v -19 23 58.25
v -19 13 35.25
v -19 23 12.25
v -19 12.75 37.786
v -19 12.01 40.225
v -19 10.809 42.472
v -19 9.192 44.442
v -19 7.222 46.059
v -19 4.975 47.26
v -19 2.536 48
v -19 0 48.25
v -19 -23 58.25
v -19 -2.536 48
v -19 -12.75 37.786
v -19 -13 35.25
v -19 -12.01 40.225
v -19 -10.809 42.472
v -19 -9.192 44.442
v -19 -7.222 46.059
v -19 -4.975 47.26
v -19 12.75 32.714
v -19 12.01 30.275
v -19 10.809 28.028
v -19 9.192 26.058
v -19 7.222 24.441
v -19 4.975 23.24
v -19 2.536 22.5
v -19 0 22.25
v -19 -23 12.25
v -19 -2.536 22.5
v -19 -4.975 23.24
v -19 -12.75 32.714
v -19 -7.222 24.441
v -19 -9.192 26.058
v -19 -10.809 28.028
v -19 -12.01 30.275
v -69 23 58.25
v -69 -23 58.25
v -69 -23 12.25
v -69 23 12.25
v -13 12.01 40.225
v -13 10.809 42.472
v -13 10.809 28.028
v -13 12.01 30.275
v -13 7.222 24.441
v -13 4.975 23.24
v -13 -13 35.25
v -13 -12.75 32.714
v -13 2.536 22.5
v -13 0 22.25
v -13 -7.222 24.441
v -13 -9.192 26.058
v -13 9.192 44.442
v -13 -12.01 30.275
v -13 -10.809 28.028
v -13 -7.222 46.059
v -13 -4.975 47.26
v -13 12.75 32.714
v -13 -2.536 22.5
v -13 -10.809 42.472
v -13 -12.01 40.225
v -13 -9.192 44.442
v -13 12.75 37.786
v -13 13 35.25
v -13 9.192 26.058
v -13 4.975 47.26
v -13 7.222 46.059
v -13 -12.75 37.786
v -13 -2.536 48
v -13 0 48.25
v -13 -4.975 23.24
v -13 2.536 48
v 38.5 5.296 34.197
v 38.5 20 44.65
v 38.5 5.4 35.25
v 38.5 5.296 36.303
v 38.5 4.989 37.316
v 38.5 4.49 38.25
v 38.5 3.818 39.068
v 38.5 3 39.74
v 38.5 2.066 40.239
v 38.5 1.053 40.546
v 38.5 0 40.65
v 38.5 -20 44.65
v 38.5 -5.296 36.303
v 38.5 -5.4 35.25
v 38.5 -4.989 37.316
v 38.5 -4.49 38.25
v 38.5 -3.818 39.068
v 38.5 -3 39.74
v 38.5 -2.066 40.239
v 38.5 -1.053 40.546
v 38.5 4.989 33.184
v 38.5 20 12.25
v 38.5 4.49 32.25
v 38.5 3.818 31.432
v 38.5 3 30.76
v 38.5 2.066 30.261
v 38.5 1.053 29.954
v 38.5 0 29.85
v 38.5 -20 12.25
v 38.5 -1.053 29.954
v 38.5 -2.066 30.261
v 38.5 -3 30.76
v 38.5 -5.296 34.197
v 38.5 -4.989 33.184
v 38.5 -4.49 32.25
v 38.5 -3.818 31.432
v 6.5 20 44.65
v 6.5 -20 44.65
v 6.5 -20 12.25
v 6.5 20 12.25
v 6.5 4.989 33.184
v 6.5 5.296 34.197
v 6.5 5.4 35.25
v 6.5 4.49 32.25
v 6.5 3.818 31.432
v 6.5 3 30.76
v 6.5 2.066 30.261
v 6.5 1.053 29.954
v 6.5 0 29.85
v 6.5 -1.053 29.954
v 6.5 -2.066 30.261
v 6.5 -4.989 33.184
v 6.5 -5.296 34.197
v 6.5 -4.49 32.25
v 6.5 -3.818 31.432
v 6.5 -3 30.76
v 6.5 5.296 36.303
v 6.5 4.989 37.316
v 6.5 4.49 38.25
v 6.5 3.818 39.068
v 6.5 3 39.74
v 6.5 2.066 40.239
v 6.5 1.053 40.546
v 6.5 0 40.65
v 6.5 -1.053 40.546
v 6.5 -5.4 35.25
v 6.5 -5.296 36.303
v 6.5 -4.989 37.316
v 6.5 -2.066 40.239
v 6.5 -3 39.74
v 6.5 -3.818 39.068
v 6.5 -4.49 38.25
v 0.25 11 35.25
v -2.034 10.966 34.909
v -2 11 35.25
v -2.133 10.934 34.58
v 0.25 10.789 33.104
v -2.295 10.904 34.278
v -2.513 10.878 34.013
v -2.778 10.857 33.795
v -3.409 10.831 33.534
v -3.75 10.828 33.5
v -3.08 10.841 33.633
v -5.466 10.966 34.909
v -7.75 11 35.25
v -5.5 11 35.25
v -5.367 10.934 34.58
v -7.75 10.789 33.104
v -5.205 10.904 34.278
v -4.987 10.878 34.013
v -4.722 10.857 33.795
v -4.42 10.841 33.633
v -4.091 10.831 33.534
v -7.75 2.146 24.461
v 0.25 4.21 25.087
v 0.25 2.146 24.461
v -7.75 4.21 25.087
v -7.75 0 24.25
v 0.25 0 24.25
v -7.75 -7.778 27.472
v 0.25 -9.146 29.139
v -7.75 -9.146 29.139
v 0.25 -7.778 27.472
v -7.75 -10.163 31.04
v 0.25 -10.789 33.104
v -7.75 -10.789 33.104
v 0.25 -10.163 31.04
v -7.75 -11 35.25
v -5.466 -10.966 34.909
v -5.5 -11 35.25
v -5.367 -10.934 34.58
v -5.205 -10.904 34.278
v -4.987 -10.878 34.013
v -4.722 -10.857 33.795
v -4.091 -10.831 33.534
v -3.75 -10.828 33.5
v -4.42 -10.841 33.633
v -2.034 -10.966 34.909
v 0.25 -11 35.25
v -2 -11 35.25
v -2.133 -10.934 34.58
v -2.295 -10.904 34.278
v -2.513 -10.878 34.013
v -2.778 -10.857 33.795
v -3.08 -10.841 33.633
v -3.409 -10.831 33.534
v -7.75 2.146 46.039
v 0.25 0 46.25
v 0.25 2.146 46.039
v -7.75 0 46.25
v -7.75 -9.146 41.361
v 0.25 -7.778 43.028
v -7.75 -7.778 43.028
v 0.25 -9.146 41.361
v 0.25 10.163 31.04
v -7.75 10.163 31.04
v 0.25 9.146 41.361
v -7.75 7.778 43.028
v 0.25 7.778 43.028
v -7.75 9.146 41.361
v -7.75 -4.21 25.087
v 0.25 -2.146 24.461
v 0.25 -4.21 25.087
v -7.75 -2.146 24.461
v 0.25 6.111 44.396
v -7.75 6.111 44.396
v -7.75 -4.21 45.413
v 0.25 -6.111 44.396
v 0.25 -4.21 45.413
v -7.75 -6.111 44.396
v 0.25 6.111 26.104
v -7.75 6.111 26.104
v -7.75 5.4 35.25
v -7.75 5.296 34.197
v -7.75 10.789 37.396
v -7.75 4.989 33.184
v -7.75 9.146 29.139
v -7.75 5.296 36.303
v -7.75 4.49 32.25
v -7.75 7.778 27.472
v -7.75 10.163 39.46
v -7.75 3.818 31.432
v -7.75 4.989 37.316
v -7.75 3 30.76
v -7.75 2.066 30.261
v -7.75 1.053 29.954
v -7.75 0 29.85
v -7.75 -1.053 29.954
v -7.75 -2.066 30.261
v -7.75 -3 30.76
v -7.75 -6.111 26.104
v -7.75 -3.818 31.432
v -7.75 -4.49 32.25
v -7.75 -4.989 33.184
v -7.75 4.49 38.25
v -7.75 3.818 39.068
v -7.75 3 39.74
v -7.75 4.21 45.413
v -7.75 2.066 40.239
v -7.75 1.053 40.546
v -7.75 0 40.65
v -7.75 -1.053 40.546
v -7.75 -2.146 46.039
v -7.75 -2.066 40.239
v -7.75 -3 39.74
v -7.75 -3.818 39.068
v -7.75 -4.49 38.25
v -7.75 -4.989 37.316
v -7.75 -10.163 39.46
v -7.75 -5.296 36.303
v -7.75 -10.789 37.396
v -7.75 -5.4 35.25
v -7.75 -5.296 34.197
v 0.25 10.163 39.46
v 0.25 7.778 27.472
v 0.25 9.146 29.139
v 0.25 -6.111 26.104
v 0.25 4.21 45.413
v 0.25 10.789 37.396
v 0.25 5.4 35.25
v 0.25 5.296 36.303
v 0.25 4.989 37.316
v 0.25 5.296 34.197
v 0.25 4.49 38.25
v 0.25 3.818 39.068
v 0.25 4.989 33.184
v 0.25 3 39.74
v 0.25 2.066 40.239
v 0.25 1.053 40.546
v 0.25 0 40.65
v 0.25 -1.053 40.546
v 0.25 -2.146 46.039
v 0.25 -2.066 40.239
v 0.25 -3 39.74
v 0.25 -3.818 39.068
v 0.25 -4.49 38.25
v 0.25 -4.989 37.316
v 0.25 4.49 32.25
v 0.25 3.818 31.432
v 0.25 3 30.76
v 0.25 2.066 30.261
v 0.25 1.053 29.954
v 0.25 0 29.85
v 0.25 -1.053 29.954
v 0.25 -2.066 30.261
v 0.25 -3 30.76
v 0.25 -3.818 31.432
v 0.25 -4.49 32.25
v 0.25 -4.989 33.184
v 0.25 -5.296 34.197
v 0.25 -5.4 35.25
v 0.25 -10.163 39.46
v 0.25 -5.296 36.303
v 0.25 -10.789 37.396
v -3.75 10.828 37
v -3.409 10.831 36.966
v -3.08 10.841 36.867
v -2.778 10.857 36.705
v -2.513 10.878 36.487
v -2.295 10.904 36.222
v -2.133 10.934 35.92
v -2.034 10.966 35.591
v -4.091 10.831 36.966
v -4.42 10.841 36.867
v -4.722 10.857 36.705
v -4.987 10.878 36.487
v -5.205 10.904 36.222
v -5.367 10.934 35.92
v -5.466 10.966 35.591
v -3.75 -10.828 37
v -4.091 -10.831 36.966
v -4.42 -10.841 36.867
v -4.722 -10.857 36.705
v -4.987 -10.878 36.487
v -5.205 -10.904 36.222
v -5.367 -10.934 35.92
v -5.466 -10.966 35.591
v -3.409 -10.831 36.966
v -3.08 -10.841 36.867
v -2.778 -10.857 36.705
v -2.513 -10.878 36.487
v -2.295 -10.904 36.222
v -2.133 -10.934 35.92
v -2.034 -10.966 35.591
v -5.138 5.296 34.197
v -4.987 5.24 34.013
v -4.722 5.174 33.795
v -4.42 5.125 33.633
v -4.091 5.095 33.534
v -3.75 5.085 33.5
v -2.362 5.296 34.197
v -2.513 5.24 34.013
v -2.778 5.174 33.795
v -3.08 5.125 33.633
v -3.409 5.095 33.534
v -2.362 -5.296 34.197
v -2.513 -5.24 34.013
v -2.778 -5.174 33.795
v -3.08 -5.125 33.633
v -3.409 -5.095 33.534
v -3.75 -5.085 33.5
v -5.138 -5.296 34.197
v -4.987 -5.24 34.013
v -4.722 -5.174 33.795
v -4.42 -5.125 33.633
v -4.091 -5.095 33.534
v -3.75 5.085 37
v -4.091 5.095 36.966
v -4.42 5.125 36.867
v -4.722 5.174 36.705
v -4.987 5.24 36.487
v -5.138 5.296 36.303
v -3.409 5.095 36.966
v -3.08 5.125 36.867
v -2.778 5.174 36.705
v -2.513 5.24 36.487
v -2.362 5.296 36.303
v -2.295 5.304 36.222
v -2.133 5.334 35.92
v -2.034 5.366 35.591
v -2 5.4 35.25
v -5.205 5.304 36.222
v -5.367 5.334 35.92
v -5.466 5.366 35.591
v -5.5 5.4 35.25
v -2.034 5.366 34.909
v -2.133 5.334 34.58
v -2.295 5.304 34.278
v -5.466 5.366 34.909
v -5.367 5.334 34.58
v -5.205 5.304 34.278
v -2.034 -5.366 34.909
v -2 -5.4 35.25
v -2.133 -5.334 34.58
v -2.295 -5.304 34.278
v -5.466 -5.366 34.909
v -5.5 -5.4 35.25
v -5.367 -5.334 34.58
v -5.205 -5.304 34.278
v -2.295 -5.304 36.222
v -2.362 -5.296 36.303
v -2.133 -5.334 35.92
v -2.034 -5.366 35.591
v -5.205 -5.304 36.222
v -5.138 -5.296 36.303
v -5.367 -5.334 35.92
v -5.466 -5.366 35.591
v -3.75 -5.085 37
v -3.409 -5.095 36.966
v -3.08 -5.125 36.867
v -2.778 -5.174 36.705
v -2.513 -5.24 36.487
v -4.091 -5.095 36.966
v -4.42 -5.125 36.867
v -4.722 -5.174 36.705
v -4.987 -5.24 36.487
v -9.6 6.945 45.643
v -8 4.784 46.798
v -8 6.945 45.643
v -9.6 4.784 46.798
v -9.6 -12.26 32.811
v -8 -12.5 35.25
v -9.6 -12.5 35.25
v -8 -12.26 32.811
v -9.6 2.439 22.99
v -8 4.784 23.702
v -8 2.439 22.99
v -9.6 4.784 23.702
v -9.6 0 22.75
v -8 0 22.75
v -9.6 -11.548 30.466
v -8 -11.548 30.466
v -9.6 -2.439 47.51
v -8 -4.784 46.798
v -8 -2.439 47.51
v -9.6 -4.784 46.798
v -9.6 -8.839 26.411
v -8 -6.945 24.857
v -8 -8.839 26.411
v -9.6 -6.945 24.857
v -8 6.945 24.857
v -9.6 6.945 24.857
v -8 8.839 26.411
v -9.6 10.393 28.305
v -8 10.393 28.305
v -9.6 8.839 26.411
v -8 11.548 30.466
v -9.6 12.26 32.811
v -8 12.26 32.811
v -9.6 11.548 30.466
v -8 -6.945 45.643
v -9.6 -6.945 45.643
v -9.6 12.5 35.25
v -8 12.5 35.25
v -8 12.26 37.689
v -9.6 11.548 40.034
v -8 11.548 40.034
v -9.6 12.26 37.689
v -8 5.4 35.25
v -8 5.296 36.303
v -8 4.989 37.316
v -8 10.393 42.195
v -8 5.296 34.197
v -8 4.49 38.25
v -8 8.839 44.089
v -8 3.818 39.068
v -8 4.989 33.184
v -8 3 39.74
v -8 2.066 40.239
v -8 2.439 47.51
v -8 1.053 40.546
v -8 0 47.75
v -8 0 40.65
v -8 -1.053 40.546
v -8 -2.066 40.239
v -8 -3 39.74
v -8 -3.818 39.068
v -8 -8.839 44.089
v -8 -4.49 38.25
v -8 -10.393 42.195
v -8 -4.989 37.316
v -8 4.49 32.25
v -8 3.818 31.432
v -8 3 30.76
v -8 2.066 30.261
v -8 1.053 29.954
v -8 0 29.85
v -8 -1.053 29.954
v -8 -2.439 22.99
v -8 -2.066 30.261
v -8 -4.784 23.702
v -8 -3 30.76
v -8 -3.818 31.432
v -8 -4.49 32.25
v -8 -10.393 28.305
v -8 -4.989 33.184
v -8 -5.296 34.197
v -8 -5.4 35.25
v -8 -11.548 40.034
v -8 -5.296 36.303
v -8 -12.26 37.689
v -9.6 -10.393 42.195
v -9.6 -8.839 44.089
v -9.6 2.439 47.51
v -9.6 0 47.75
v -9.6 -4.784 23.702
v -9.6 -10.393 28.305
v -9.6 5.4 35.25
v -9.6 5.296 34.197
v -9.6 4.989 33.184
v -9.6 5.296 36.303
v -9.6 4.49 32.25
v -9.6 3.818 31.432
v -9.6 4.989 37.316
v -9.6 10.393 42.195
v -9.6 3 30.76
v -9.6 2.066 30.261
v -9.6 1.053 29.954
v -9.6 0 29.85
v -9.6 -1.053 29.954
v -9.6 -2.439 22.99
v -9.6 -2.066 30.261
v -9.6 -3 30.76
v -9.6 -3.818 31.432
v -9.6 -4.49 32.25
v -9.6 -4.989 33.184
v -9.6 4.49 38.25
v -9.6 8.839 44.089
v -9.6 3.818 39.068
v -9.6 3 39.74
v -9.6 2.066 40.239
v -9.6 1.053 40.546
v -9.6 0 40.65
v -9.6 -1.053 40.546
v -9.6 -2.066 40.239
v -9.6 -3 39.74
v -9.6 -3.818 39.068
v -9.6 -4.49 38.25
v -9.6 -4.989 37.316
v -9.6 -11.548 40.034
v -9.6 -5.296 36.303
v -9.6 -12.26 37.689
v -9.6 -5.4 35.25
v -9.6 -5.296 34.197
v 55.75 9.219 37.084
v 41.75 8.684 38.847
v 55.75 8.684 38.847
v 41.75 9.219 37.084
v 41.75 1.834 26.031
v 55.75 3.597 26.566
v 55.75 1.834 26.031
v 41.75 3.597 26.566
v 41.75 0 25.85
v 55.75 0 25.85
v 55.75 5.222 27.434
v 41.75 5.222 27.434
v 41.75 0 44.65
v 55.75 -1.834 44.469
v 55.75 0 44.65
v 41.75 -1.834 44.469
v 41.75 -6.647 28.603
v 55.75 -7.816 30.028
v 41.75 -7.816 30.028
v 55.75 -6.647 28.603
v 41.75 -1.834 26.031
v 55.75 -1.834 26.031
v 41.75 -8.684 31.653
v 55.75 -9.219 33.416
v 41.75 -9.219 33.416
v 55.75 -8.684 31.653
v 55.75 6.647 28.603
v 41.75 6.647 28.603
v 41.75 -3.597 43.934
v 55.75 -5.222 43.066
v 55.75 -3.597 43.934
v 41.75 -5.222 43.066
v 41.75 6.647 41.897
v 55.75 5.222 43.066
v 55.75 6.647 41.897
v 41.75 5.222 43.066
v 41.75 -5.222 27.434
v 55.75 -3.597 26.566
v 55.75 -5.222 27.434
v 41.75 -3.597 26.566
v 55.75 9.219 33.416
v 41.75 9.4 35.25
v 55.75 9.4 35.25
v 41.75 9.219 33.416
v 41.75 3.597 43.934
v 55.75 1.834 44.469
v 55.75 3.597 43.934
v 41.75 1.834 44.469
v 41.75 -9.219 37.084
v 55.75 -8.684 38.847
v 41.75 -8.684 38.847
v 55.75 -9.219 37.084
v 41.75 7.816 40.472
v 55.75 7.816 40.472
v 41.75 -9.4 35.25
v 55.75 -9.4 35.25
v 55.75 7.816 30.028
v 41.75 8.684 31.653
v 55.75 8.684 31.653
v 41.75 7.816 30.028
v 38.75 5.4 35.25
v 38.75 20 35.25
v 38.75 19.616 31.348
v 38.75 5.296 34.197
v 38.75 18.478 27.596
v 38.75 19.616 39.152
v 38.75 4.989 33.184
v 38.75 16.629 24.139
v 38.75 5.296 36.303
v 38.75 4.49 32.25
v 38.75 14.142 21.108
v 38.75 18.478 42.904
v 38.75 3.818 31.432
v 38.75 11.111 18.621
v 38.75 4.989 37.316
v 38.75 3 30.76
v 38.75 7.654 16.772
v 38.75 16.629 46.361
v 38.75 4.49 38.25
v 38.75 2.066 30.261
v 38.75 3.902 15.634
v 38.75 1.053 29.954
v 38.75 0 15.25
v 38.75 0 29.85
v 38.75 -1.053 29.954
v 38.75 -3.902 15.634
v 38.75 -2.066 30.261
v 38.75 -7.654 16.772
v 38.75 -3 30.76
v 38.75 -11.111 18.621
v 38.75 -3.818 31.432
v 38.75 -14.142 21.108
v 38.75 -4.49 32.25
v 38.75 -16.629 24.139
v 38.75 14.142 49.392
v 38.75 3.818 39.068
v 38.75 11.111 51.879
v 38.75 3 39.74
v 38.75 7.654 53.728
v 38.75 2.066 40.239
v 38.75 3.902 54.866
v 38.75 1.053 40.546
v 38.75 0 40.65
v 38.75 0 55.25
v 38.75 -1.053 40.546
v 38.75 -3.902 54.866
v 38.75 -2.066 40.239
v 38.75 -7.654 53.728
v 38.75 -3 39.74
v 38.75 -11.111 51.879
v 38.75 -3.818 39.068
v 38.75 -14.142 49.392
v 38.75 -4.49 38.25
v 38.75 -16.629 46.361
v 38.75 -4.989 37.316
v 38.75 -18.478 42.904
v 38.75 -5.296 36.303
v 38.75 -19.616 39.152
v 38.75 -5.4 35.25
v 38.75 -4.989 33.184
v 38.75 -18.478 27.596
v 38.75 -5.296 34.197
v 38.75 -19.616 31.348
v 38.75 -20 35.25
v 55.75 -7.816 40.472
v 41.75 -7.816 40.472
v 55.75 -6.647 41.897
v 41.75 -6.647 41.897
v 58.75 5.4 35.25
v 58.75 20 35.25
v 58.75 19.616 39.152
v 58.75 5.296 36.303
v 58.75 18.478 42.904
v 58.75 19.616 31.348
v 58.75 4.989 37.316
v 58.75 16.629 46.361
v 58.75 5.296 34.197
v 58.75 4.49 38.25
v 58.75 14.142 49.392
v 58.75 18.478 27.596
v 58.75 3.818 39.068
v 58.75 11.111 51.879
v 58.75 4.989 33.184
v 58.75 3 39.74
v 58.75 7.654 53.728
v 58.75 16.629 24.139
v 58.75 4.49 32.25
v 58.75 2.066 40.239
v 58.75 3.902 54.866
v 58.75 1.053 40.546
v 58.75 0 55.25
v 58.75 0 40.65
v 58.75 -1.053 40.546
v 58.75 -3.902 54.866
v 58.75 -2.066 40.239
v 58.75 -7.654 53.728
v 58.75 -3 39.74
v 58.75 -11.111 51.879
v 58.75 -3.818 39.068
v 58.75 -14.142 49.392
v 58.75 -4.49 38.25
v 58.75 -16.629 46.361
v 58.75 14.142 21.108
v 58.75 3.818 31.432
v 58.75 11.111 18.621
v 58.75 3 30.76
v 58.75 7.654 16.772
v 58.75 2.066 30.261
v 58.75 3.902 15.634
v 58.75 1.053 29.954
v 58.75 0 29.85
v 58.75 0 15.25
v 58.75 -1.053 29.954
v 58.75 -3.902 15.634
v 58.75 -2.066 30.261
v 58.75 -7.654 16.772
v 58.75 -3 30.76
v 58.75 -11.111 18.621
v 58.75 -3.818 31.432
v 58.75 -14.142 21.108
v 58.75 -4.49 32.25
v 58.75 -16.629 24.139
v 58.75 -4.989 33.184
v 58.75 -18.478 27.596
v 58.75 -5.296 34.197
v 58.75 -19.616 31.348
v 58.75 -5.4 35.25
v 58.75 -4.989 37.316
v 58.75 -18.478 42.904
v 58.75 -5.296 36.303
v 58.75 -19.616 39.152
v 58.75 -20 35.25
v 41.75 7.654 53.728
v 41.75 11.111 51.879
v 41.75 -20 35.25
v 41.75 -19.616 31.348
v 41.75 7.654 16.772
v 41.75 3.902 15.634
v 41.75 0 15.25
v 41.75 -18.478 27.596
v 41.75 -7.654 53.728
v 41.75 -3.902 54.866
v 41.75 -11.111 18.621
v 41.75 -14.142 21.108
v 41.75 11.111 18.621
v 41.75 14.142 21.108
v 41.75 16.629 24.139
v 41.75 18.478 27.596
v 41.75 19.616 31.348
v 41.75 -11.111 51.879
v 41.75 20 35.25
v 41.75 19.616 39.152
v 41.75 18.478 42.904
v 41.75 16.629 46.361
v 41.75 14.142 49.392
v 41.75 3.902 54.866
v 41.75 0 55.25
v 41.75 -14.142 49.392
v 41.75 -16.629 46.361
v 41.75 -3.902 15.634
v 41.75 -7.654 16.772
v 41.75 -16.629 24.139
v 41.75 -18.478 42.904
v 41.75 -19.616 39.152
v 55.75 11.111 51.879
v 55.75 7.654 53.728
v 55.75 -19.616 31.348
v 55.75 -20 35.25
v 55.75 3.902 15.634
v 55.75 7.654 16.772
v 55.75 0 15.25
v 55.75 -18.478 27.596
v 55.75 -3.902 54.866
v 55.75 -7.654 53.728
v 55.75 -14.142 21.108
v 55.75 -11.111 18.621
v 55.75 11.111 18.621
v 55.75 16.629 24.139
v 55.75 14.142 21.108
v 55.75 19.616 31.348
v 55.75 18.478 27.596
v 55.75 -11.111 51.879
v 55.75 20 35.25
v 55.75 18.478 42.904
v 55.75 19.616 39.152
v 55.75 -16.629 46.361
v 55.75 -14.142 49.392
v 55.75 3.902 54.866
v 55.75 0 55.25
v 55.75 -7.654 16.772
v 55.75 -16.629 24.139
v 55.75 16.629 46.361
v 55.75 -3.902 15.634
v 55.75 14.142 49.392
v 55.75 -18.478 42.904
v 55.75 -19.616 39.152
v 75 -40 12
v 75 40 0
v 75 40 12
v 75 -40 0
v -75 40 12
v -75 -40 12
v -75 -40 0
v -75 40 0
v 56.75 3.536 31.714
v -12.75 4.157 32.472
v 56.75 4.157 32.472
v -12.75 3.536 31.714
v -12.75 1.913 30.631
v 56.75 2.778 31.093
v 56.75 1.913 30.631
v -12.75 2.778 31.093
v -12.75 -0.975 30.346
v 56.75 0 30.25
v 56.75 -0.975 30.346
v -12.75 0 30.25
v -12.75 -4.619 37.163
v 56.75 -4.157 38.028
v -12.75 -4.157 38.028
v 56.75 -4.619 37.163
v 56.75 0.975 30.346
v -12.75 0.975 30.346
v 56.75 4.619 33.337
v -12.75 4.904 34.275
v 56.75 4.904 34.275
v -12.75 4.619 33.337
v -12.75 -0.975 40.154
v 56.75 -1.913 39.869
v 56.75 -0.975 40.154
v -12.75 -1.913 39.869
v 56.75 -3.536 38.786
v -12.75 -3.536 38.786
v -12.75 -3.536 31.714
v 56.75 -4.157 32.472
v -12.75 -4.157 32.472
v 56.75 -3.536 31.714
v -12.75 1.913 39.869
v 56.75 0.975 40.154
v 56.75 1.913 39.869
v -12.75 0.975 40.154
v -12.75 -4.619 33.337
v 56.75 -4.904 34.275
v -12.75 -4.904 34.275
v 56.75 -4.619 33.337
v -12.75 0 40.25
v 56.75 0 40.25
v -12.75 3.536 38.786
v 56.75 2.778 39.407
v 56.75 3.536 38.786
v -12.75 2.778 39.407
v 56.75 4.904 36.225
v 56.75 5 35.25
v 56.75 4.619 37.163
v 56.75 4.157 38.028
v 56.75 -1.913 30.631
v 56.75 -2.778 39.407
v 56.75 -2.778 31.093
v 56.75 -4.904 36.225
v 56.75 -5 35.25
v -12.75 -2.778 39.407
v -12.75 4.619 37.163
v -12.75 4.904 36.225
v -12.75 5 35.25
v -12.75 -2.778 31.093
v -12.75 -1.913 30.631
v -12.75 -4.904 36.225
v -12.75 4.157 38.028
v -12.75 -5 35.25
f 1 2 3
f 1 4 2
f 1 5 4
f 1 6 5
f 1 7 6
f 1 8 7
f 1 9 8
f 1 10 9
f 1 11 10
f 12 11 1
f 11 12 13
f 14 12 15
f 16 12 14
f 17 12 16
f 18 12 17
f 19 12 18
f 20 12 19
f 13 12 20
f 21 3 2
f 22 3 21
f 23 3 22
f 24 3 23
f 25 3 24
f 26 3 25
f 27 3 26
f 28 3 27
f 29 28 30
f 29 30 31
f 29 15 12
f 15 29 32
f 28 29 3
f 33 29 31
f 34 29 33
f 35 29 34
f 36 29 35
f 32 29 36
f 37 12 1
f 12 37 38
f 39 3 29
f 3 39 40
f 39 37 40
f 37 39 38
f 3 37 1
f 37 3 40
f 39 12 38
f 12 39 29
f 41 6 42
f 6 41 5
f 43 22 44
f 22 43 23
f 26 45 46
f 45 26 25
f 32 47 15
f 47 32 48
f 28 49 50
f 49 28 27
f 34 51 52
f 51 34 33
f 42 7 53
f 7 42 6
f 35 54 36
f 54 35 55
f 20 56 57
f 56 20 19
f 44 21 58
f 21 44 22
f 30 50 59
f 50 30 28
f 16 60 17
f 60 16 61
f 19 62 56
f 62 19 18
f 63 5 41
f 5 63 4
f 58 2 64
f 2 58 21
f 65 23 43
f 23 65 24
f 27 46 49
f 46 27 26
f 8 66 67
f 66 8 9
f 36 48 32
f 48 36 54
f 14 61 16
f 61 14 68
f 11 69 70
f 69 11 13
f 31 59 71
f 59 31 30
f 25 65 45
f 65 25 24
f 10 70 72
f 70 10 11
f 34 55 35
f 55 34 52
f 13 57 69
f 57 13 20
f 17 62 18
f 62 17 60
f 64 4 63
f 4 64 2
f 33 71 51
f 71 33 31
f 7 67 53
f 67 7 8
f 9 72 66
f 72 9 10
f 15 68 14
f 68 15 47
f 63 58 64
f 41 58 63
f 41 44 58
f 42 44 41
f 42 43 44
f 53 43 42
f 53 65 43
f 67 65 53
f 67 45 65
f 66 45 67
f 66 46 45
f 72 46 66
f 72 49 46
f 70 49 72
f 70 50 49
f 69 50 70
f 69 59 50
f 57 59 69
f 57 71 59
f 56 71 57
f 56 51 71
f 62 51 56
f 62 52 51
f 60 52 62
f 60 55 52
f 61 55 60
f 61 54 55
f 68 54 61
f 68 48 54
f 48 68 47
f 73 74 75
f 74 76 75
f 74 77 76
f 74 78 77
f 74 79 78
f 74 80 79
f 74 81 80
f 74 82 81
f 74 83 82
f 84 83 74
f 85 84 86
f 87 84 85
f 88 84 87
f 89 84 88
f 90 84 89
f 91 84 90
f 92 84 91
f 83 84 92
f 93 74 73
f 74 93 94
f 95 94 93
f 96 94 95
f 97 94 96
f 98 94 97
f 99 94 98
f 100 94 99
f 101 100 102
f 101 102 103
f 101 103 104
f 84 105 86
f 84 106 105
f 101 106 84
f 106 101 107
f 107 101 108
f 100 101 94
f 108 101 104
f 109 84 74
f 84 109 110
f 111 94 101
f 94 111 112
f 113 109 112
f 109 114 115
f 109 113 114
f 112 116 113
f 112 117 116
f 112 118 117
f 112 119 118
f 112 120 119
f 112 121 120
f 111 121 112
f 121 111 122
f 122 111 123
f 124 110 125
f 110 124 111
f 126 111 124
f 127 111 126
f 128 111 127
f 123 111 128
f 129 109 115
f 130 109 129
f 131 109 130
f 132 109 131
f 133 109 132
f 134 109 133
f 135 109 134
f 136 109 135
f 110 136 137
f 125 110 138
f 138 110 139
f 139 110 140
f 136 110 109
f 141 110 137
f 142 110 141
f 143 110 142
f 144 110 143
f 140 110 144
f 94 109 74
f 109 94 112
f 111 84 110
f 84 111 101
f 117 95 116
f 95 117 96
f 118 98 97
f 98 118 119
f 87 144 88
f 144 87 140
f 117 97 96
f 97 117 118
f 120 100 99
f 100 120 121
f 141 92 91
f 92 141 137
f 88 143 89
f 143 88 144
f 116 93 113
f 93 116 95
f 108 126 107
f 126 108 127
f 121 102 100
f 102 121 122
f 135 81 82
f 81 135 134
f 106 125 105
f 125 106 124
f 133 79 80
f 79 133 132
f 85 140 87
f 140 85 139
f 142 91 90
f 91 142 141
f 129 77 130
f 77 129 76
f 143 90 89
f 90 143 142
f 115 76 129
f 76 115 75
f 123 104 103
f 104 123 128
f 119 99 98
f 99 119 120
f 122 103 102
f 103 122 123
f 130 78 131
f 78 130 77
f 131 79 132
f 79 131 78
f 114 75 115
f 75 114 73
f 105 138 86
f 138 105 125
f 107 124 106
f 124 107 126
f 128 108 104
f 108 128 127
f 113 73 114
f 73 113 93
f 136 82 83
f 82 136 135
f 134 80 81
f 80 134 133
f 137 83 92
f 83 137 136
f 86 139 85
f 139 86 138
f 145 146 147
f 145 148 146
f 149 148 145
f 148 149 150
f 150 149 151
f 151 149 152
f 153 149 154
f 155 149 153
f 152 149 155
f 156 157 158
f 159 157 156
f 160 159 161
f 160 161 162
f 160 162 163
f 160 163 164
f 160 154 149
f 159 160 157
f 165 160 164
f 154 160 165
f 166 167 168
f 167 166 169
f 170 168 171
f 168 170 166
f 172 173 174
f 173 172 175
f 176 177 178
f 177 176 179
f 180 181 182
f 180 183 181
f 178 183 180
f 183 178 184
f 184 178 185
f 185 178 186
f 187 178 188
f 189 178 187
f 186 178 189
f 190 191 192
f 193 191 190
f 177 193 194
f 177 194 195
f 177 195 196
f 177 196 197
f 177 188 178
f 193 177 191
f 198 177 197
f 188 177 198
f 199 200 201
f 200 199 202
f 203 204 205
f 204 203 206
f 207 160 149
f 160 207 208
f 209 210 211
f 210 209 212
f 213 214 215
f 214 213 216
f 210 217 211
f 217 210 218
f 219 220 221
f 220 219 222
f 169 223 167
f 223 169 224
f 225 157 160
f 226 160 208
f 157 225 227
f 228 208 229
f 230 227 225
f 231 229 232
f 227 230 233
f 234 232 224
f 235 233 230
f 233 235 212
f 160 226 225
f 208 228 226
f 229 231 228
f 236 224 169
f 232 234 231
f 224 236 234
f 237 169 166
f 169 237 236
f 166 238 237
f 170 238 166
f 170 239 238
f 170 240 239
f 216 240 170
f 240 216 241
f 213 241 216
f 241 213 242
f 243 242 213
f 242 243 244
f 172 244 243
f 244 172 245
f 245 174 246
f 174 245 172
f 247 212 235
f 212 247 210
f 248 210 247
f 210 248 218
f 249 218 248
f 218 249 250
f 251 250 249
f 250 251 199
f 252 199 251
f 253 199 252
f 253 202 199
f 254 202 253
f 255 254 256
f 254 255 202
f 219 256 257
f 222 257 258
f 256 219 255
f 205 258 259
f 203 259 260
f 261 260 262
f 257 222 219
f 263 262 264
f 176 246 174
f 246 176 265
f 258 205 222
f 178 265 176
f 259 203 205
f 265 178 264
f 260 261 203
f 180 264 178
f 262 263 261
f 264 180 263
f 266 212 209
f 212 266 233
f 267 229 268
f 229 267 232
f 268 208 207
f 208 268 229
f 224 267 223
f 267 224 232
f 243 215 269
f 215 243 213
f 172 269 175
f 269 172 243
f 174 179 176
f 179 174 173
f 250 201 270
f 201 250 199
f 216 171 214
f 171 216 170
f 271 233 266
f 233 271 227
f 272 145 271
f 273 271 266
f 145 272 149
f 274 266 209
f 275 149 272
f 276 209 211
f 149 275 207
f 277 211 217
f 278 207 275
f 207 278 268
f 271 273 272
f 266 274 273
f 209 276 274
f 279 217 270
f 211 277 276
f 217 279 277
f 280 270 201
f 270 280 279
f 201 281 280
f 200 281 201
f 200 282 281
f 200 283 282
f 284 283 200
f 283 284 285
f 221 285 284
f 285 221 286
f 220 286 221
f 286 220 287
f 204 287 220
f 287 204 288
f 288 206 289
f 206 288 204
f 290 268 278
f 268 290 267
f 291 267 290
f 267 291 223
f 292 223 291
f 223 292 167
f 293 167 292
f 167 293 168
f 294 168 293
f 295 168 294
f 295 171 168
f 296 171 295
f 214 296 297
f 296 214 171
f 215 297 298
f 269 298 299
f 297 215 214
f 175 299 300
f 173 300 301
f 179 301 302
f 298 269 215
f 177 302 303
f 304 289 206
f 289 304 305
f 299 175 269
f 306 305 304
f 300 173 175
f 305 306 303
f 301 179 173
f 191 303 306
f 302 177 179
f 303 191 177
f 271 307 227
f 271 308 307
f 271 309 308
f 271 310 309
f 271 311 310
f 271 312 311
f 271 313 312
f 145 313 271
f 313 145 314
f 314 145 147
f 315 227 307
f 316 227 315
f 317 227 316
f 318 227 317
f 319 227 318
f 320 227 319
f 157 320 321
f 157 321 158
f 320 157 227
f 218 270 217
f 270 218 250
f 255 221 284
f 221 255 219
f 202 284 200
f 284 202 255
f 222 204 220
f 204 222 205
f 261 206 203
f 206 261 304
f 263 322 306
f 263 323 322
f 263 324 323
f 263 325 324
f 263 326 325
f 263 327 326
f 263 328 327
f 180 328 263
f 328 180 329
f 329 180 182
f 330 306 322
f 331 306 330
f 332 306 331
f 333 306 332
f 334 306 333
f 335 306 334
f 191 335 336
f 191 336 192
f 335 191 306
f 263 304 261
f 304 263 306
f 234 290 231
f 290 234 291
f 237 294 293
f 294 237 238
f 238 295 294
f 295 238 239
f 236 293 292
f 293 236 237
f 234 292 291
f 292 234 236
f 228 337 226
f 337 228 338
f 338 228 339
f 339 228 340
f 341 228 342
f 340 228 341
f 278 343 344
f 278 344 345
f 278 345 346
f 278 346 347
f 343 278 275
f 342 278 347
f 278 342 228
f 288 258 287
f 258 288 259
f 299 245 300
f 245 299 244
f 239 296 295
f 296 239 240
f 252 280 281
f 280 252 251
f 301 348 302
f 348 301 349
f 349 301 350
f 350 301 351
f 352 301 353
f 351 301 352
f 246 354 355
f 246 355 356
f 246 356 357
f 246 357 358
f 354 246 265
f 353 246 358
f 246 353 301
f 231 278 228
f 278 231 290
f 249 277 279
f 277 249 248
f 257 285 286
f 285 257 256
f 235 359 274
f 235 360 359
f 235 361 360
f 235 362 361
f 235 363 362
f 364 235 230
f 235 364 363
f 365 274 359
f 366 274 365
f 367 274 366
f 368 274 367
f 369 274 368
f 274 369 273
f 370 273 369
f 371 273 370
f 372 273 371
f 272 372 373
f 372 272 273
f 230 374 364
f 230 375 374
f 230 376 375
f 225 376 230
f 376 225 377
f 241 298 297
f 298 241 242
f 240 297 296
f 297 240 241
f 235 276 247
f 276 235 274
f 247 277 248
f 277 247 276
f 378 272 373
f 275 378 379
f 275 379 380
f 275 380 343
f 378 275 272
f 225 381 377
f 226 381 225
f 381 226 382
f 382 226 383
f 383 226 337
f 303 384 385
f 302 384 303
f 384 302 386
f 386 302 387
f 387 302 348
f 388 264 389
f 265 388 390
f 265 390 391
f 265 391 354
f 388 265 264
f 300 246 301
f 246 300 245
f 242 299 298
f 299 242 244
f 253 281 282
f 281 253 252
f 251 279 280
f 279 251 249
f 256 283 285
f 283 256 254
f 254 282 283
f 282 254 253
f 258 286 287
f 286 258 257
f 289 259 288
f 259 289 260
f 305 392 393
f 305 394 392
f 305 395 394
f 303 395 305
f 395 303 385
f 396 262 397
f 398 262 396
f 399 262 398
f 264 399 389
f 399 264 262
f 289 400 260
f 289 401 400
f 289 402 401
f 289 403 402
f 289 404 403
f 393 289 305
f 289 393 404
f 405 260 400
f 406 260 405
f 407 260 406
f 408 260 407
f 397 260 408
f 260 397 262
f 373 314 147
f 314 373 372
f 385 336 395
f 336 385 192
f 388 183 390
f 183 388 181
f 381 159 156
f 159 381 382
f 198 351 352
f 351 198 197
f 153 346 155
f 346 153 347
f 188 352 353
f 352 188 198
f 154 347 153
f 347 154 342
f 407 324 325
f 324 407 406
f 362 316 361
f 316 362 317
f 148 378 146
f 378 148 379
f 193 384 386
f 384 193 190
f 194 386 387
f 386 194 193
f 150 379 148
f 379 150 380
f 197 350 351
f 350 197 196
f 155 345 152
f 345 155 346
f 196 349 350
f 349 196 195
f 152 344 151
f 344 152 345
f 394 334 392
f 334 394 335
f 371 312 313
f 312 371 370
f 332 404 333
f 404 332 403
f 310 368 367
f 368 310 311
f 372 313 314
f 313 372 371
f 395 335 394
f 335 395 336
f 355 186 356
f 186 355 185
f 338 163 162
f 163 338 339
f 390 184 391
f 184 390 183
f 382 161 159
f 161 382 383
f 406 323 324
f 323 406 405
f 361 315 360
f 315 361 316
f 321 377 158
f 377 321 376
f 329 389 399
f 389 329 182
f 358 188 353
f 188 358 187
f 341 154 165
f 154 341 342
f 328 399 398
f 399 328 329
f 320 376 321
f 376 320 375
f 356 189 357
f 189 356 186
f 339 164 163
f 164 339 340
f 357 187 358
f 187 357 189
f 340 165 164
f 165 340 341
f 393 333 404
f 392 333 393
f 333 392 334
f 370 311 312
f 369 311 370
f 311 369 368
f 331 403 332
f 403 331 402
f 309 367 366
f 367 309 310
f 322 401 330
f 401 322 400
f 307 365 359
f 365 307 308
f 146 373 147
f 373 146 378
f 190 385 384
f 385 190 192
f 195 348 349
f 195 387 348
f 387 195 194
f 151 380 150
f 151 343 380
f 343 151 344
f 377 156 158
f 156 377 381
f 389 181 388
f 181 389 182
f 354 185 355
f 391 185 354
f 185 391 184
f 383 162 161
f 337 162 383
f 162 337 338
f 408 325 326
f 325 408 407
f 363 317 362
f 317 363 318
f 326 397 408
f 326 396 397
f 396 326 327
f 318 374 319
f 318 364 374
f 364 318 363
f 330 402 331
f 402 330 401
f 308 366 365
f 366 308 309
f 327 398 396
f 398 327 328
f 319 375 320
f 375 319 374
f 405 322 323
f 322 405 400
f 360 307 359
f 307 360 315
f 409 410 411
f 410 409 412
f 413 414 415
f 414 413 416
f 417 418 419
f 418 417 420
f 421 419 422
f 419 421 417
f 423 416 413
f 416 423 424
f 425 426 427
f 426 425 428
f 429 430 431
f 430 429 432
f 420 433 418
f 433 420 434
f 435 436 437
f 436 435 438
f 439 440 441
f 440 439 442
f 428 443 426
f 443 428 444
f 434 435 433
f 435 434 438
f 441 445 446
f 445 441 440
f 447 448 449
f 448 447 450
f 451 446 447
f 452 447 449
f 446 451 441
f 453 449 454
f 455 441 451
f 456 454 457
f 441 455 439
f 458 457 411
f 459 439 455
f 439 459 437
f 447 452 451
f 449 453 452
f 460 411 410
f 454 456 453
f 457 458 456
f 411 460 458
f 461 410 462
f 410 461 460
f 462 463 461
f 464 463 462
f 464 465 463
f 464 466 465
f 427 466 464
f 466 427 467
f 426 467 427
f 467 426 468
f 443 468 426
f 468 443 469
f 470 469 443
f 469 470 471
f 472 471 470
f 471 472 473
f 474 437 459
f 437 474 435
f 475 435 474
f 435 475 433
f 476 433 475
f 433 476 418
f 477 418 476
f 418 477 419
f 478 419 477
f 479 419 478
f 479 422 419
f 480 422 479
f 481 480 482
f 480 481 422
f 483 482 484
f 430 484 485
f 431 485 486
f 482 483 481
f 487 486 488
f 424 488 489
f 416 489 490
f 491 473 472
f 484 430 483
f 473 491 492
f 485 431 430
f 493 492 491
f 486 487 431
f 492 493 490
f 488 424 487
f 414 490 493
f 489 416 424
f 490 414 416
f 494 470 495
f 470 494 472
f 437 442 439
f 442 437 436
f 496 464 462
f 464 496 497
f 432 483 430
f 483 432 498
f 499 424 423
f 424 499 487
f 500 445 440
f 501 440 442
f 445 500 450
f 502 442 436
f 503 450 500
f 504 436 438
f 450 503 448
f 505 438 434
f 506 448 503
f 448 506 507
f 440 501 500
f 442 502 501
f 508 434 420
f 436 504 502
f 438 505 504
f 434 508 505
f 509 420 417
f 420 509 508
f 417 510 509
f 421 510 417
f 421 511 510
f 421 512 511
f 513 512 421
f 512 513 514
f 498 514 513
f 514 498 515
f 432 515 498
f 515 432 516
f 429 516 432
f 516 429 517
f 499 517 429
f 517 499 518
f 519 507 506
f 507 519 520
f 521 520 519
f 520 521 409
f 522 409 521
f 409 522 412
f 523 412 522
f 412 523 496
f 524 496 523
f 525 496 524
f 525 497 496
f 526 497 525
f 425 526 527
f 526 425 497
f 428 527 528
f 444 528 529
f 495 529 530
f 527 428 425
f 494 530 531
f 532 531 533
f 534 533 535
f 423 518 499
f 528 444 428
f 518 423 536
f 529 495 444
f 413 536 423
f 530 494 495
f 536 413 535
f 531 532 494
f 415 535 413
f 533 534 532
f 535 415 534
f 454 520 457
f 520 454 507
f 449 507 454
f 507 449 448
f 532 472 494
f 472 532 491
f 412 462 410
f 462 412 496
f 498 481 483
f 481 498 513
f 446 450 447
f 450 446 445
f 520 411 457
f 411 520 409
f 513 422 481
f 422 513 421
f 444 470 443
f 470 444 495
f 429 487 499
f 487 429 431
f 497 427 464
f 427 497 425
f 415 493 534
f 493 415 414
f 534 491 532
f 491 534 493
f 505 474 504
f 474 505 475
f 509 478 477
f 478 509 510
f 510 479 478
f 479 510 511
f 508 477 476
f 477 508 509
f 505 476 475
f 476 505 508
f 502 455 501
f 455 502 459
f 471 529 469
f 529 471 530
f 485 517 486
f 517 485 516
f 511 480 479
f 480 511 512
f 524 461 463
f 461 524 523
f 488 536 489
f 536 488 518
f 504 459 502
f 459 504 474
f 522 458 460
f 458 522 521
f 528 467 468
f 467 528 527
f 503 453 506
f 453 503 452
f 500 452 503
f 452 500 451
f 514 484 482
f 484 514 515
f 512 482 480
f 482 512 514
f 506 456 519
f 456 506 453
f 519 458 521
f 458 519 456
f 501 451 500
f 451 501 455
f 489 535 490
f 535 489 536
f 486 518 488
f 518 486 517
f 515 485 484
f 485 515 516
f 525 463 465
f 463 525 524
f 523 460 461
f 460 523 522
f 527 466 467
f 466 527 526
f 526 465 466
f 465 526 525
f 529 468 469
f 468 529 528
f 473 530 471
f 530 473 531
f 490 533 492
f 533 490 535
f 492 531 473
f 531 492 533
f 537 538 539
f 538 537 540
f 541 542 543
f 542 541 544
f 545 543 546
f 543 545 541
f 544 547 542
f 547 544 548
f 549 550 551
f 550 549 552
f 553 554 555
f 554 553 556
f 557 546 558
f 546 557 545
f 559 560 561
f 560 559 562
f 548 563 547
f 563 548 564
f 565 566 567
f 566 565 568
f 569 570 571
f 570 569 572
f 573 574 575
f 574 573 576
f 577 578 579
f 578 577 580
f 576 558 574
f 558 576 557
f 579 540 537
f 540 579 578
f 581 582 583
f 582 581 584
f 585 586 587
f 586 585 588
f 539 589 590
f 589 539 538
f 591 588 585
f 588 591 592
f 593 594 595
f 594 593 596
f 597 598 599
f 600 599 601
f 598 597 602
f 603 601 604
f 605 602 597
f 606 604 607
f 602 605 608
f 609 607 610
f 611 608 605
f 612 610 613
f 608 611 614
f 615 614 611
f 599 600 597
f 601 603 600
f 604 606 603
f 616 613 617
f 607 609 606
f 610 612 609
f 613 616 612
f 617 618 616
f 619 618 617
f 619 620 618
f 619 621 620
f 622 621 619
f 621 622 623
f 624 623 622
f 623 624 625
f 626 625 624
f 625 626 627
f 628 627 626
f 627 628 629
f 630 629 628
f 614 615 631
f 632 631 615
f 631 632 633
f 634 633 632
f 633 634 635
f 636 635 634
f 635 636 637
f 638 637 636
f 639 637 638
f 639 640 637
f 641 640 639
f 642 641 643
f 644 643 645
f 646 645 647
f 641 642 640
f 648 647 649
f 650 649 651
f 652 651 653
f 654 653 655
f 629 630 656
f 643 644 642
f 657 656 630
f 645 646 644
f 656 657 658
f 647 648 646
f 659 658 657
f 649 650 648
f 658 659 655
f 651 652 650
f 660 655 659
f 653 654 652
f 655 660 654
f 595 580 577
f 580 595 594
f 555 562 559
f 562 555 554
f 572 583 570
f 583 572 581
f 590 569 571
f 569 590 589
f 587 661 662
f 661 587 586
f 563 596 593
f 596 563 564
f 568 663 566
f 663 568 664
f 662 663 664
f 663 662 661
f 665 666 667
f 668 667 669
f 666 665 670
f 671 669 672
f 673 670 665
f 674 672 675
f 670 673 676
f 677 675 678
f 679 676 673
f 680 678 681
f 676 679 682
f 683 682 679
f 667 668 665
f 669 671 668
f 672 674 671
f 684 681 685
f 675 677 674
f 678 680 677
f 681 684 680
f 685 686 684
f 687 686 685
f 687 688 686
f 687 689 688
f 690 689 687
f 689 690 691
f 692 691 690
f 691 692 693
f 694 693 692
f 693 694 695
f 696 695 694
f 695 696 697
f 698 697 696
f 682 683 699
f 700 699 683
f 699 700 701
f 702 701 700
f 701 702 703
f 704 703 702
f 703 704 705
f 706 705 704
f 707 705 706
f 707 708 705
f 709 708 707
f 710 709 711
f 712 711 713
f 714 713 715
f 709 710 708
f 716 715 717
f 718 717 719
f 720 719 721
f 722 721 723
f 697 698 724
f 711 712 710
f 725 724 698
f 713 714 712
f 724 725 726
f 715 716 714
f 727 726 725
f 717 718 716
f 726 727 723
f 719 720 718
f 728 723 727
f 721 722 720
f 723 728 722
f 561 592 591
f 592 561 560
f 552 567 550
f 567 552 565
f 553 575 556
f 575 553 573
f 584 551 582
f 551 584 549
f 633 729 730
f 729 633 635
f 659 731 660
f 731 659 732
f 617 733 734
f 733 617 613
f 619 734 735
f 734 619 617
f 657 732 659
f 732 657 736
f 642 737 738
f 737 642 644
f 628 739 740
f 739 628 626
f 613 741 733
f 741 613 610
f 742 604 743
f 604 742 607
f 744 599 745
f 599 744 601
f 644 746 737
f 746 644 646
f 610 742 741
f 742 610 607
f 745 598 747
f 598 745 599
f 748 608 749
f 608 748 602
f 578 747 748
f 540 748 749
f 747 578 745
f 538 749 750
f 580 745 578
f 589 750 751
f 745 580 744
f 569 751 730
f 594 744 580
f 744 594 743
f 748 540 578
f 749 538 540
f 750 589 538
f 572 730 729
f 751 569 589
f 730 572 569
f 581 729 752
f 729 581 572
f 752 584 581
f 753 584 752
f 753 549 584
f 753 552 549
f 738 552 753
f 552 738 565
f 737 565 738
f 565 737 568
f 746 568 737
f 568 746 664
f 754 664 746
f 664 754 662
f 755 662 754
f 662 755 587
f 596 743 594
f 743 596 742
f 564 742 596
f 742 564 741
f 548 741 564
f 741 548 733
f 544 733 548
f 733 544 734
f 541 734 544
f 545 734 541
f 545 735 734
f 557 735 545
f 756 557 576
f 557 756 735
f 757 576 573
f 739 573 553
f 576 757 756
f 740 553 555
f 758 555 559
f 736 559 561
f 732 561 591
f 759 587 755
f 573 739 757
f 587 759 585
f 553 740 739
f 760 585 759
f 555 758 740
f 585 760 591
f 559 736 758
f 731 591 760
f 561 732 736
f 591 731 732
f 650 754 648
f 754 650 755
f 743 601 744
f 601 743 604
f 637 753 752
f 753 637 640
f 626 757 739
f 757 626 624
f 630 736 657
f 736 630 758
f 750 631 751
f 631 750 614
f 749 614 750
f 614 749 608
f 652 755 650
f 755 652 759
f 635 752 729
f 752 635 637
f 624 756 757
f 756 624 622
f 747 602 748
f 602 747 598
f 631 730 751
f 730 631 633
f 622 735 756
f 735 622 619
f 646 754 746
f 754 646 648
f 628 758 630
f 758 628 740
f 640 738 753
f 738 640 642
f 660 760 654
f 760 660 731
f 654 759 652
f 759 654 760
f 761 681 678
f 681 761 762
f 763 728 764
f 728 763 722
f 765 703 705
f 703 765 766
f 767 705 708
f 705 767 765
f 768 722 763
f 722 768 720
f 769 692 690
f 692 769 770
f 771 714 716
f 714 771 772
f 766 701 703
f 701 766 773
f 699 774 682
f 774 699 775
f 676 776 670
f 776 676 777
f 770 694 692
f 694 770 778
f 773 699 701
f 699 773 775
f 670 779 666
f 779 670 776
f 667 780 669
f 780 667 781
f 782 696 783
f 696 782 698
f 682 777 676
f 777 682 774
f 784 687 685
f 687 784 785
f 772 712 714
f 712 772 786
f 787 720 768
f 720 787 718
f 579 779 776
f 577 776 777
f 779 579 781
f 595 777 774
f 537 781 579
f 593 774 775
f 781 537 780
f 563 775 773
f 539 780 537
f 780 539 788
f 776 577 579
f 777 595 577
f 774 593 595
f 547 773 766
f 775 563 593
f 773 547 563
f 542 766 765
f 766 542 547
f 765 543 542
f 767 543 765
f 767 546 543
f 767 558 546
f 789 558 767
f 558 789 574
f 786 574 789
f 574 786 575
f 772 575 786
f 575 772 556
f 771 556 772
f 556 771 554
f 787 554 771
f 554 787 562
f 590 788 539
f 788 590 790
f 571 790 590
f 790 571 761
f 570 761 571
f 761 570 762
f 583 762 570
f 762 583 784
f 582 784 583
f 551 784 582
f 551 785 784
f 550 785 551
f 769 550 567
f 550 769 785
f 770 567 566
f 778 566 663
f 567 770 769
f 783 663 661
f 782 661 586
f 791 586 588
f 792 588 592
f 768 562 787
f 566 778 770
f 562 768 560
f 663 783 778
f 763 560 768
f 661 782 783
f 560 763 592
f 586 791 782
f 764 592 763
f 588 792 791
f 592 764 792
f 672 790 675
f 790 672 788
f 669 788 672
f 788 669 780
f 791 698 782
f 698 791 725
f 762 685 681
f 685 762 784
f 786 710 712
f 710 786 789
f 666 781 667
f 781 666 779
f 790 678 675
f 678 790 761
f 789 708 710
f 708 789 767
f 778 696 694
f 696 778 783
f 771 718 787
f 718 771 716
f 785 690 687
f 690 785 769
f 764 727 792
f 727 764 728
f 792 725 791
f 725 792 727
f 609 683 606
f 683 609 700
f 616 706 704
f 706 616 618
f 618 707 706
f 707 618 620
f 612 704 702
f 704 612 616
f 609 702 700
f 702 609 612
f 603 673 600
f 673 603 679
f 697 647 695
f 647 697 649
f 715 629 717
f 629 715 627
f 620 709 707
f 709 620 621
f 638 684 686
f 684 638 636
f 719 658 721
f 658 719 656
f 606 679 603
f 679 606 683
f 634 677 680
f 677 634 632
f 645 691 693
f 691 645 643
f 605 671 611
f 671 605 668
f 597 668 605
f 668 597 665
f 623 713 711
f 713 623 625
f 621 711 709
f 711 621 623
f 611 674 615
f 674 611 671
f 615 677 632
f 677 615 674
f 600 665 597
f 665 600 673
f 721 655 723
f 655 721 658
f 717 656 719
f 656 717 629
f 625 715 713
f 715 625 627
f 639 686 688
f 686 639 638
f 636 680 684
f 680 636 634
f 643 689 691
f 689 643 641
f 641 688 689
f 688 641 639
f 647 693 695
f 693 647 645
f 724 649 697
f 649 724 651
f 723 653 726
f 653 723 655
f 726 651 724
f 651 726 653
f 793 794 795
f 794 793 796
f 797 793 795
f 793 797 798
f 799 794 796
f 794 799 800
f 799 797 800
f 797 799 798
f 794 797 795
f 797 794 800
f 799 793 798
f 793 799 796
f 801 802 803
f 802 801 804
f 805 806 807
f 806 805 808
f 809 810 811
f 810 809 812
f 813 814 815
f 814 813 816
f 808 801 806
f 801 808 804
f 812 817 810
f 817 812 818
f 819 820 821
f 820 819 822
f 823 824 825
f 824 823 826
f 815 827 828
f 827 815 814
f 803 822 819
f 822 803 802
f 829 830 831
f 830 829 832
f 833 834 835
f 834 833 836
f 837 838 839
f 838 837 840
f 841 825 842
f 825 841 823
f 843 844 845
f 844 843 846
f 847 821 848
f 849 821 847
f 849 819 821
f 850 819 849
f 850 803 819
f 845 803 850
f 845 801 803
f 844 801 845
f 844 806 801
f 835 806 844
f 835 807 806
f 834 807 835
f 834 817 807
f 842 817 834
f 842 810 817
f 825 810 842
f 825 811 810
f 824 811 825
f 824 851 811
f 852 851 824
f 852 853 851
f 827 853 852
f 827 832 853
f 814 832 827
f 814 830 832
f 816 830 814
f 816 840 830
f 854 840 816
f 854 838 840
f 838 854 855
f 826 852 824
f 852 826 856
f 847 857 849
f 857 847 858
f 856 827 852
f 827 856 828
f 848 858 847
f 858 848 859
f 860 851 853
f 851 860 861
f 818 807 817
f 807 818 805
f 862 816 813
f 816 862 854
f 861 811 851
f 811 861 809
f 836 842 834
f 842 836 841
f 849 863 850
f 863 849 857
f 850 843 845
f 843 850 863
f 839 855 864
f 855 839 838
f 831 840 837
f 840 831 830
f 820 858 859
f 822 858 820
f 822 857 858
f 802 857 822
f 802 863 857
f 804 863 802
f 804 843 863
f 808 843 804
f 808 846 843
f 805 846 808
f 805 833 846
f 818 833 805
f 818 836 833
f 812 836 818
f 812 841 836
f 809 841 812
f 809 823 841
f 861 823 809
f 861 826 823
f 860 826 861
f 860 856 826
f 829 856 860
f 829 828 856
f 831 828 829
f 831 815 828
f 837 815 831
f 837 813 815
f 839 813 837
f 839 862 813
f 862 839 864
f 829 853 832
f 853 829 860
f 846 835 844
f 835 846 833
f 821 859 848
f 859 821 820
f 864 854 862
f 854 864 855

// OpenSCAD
$fn = 32;

// ------------------------------------------------------------------------
// Motor drive station: motor 50 x 46 mm, shaft d10, pulley d40
// Every part is its own module, assembly() places every instance.
// ------------------------------------------------------------------------

// --- part 1 ---
module station_bed() {
  difference() {
    translate([-75, -40, 0]) cube([150, 80, 12]);
  }
}

// --- part 2 ---
module drive_motor() {
  union() {
    translate([-25, -23, 0]) cube([50, 46, 46]);
    translate([28, 0, 23]) rotate([0, 90, 0]) cylinder(h = 6, d = 26, center = true);
  }
}

// --- part 3 ---
module pillow_block() {
  difference() {
    translate([-16, -20, 0]) cube([32, 40, 32.4]);
    translate([0, 0, 23]) rotate([0, 90, 0]) cylinder(h = 34, d = 10.8, center = true);
  }
}

// --- part 4 ---
module drive_shaft() {
  translate([0, 0, -34.75]) cylinder(h = 69.5, d = 10);
}

// --- part 5 ---
module shaft_collar() {
  difference() {
    cylinder(h = 8, d = 22);
    translate([0, 0, -1]) cylinder(h = 10, d = 10.8);
    translate([0, 0, 4]) rotate([90, 0, 0]) cylinder(h = 24, d = 3.5, center = true);
  }
}

// --- part 6 ---
module collar_washer() {
  difference() {
      translate([0, 0, 0]) cylinder(h = 1.6, d = 25);
      translate([0, 0, -1]) cylinder(h = 3.6, d = 10.8);
    }
}

// --- part 7 ---
module drive_pulley() {
  difference() {
    union() {
      cylinder(h = 20, d = 18.8);
      cylinder(h = 3, d = 40);
      translate([0, 0, 17]) cylinder(h = 3, d = 40);
    }
    translate([0, 0, -1]) cylinder(h = 22, d = 10.8);
  }
}

// --- assembly ---
module assembly() {
  color([0.80, 0.24, 0.20]) translate([0, 0, 0]) rotate([0, 0, 0]) station_bed();
  color([0.20, 0.45, 0.75]) translate([-44, 0, 12.25]) rotate([0, 0, 0]) drive_motor();
  color([0.25, 0.62, 0.32]) translate([22.5, 0, 12.25]) rotate([0, 0, 0]) pillow_block();
  color([0.92, 0.70, 0.18]) translate([22, 0, 35.25]) rotate([0, 90, 0]) drive_shaft();
  color([0.58, 0.35, 0.70]) translate([-7.75, 0, 35.25]) rotate([0, 90, 0]) shaft_collar();
  color([0.16, 0.66, 0.66]) translate([-9.6, 0, 35.25]) rotate([0, 90, 0]) collar_washer();
  color([0.85, 0.48, 0.18]) translate([38.75, 0, 35.25]) rotate([0, 90, 0]) drive_pulley();
}

assembly();
